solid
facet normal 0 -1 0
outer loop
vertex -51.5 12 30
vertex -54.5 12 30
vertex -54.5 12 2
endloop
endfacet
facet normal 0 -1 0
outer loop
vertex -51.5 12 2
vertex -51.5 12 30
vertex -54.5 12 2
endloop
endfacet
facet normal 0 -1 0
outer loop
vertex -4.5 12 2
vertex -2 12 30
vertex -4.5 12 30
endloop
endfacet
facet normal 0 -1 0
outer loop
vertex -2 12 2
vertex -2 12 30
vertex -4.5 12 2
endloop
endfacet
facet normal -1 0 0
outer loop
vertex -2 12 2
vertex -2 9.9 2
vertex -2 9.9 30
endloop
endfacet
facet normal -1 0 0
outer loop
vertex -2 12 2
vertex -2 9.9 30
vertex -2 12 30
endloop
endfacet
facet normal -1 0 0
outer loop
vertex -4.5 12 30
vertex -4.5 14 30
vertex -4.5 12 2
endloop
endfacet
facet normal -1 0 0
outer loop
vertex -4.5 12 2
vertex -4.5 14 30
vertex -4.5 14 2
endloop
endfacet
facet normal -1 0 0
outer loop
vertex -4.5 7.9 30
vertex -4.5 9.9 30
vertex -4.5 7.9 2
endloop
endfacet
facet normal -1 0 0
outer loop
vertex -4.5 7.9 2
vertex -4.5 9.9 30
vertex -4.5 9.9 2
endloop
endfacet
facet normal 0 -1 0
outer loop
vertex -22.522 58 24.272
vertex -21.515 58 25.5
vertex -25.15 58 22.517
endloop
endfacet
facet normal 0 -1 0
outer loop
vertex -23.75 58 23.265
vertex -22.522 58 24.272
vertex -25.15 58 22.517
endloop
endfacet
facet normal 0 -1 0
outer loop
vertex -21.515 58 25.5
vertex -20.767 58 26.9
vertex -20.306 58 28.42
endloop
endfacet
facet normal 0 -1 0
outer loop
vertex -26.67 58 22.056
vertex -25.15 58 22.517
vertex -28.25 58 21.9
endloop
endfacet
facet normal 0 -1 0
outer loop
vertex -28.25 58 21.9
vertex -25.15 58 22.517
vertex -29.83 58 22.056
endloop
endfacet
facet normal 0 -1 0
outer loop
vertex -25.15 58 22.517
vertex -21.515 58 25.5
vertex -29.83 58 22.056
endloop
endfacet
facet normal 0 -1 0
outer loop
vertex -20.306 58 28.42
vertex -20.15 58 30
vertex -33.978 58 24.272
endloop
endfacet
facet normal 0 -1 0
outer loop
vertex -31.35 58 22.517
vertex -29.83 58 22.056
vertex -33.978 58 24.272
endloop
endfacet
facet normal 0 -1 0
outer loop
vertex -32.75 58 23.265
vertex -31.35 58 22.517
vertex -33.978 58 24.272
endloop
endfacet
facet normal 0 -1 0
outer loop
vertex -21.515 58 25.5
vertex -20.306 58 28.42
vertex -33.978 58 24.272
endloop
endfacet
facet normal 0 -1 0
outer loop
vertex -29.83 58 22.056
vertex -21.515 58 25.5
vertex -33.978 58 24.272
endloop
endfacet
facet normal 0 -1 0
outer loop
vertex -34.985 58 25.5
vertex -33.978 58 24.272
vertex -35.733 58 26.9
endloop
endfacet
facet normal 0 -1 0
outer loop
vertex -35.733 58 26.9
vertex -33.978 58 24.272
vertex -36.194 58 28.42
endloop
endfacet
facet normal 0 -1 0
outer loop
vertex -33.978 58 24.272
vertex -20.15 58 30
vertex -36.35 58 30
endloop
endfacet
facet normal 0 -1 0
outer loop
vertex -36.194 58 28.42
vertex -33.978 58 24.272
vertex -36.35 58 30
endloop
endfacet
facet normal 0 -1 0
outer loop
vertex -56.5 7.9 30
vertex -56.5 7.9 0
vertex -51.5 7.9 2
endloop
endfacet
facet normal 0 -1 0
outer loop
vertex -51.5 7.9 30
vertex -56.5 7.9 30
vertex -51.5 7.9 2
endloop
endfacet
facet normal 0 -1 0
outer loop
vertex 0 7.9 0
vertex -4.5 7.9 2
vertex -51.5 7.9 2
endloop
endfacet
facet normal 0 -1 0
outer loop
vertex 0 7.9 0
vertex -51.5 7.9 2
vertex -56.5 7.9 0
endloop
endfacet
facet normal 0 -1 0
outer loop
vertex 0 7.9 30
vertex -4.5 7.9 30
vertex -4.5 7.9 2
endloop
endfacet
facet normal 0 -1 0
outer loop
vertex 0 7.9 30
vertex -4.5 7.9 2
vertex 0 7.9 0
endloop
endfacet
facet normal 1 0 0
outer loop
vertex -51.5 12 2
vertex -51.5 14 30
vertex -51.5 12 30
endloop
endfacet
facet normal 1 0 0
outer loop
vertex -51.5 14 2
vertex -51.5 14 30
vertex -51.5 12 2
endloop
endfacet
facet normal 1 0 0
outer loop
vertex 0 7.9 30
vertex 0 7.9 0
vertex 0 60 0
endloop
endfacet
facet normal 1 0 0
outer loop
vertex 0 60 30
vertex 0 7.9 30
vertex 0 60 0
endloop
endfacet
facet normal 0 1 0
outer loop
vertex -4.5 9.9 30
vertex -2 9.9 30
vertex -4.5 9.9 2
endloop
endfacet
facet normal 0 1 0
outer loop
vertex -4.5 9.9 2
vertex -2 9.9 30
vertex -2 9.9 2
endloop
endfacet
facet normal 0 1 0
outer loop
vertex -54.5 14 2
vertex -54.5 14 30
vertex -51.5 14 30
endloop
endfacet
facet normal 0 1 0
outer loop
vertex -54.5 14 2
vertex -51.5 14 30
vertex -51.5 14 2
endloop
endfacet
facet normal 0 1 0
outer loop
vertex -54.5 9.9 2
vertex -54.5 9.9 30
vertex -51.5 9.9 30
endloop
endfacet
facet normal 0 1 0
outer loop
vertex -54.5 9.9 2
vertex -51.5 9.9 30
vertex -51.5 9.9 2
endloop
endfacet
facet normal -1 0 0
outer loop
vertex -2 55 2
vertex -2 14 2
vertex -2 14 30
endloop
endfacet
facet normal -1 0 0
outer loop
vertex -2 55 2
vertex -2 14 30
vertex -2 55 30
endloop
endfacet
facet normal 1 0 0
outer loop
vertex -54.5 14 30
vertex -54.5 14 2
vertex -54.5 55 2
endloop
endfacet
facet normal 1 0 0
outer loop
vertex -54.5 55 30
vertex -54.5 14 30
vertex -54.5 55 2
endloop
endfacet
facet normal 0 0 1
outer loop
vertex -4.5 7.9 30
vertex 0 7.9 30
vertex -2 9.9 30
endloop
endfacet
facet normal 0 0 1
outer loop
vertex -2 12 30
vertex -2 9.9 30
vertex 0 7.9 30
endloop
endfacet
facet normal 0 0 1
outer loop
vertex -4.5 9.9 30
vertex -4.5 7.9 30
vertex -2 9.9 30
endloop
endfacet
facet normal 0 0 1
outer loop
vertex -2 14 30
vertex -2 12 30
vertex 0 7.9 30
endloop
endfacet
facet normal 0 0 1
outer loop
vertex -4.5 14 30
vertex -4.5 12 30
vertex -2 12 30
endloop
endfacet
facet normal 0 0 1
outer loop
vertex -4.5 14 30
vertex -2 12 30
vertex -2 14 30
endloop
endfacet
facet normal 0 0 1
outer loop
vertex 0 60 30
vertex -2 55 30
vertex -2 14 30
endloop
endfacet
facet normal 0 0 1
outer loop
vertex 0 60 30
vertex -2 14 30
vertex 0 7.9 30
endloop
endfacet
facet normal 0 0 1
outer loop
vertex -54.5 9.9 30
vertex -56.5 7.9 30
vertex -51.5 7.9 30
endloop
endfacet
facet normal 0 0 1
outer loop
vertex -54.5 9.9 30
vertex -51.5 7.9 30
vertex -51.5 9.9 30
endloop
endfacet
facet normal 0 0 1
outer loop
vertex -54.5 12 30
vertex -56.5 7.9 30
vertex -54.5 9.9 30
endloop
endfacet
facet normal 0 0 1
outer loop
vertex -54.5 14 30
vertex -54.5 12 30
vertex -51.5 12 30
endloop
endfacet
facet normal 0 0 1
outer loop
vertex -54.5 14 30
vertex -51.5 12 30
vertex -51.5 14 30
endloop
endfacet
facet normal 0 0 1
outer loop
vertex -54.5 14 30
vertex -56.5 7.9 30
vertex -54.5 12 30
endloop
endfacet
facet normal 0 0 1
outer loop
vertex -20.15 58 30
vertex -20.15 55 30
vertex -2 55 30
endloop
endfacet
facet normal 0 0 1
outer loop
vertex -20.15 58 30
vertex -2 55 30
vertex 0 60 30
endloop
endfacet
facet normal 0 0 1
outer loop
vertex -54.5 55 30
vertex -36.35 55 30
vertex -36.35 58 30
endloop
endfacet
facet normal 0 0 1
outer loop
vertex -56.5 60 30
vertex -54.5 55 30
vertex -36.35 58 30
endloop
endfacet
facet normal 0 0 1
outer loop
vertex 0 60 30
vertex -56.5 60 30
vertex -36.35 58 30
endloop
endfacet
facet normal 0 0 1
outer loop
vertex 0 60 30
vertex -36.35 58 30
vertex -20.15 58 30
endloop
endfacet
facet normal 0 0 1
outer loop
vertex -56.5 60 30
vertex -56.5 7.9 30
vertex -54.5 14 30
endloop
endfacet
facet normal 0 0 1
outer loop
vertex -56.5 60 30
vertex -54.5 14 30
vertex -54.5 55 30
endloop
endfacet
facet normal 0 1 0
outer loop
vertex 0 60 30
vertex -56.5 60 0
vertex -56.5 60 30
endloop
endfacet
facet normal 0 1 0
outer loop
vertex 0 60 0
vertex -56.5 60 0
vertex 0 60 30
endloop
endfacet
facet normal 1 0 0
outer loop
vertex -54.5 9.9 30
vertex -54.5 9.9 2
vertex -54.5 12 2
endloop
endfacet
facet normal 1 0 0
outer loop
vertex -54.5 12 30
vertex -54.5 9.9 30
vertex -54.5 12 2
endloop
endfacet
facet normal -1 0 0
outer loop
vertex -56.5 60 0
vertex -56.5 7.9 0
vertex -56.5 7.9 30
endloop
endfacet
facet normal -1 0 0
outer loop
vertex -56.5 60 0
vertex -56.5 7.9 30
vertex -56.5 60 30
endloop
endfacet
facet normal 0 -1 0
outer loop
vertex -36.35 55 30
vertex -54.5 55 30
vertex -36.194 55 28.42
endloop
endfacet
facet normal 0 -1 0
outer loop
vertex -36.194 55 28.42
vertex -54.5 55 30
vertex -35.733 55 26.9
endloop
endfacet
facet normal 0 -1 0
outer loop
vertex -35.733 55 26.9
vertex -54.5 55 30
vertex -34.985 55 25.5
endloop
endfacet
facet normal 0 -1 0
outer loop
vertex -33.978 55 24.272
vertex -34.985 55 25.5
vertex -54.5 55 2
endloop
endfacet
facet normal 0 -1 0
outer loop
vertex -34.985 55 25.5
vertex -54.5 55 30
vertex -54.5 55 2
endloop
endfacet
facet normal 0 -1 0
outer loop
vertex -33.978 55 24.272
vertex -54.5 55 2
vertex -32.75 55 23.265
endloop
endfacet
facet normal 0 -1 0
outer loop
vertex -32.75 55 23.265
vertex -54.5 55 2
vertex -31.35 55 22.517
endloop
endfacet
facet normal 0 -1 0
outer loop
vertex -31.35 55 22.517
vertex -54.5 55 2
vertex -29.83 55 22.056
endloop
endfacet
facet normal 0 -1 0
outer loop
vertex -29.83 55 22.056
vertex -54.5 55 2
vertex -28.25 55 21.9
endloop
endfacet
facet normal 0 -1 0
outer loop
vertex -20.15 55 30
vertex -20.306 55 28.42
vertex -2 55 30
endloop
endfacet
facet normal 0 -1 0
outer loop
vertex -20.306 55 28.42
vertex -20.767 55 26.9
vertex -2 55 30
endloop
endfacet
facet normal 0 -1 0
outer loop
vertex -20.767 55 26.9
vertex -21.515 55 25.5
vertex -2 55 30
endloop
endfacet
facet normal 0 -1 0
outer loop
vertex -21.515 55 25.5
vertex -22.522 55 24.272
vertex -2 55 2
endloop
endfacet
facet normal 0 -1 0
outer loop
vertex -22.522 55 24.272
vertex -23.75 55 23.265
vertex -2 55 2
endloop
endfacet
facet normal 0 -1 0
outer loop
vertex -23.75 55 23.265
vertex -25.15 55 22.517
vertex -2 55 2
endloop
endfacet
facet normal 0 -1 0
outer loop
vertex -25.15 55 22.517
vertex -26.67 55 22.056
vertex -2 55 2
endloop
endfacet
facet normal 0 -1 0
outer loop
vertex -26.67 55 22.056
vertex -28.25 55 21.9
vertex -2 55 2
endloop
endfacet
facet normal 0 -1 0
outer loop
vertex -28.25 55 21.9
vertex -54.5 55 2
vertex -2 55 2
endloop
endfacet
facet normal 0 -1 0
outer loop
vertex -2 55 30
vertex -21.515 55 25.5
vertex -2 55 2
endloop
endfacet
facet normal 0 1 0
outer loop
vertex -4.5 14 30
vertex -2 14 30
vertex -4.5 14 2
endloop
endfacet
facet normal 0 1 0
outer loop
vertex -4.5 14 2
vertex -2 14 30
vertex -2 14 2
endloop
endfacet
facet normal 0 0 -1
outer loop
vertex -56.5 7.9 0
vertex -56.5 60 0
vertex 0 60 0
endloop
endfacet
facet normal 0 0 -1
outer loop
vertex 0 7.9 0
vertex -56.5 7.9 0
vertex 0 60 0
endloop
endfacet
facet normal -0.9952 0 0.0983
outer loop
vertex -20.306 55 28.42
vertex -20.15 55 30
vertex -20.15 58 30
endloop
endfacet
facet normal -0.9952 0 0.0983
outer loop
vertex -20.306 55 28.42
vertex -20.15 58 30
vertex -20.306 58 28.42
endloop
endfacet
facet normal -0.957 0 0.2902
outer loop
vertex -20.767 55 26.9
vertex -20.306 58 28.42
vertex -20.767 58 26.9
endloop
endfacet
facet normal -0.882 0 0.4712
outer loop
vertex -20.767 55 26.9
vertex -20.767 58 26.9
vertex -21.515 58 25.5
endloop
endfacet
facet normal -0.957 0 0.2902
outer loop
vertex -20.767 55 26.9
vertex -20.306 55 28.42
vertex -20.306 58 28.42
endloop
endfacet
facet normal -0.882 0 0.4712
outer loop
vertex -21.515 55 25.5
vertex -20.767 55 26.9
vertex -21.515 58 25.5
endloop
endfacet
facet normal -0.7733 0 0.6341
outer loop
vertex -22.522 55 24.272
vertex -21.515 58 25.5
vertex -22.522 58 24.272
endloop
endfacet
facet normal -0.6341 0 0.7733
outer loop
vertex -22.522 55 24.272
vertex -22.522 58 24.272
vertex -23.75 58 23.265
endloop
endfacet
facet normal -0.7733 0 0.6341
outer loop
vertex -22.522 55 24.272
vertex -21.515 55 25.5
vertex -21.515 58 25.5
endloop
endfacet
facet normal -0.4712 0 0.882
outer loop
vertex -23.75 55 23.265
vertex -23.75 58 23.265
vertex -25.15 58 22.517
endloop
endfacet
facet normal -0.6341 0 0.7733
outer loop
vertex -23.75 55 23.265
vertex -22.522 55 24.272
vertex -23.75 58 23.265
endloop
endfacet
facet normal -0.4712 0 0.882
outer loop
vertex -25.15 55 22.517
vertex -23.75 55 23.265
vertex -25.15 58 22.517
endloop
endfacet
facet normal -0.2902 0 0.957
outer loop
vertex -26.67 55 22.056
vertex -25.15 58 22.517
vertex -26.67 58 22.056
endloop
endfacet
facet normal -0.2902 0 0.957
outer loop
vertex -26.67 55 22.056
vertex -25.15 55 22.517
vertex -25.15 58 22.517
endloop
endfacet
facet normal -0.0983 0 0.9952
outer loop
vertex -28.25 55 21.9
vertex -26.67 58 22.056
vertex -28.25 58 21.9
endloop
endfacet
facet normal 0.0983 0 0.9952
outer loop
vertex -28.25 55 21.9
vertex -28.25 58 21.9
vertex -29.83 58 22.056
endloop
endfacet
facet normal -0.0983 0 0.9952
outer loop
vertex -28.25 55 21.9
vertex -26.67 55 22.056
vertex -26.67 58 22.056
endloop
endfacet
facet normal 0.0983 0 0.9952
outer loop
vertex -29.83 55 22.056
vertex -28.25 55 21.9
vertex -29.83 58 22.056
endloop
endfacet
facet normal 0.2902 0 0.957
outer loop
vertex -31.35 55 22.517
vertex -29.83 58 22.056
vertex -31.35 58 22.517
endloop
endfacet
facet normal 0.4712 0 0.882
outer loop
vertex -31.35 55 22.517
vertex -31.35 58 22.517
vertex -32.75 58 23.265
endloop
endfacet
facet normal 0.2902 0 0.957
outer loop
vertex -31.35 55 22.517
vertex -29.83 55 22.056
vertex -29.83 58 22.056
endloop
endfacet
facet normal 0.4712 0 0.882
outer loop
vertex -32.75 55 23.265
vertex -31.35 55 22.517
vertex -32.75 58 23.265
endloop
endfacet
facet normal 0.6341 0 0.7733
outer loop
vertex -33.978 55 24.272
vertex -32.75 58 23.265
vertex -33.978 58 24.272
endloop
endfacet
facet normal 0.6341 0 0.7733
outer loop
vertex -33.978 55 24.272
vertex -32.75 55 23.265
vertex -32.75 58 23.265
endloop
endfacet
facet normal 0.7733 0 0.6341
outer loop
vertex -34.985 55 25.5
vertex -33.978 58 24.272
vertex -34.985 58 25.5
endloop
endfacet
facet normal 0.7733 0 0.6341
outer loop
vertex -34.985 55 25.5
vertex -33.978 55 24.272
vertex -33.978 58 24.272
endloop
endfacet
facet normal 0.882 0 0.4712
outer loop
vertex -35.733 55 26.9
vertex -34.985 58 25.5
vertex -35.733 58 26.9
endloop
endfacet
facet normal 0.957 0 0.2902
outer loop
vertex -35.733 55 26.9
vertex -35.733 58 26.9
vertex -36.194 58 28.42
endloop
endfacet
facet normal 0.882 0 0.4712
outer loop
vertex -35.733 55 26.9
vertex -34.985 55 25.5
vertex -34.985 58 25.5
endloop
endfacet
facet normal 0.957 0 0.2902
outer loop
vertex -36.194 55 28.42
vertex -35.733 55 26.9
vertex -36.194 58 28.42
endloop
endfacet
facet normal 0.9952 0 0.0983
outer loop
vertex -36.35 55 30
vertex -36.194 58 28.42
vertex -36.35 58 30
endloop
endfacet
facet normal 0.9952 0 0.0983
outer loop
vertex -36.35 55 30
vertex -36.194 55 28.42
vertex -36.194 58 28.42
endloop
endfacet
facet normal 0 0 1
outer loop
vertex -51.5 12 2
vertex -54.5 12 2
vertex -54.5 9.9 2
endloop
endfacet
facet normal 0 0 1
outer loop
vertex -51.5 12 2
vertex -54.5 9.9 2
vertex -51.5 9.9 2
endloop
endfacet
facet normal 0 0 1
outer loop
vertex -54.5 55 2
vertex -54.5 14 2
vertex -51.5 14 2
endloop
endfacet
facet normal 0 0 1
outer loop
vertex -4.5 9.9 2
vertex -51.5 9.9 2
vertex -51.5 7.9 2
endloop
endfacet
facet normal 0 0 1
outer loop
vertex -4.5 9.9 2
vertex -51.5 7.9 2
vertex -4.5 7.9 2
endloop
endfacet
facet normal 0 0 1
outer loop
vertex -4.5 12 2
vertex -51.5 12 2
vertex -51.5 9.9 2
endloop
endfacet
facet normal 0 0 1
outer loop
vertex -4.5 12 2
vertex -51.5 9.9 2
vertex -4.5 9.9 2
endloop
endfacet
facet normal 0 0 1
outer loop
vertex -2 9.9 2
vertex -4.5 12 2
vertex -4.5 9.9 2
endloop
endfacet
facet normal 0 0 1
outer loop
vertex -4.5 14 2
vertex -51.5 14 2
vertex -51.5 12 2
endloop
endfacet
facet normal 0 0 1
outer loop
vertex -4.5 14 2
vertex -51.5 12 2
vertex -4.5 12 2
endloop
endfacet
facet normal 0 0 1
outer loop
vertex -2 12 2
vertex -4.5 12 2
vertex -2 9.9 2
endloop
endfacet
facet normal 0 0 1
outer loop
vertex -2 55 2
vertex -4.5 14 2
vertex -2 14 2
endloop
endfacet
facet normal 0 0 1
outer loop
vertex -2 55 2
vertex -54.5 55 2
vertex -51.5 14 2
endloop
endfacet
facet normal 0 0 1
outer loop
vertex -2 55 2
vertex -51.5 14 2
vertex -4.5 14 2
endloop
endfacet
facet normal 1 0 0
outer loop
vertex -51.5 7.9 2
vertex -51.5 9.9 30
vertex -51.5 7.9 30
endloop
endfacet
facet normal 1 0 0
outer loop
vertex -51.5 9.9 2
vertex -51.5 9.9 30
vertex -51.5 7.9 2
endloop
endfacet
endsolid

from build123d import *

# Parameters (mm, degrees)
SKETCH1_W           = 56.5
SKETCH1_H           = 60
BOSS_EXTRUDE1_DEPTH = 30
SHELL1_T            = -2
SKETCH2_W           = 52.5
SKETCH2_H           = 3
BOSS_EXTRUDE2_DEPTH = 28
CUT_EXTRUDE5_DEPTH  = 3
SKETCH6_W           = 30
SKETCH6_H           = 2
BOSS_EXTRUDE3_DEPTH = 3
SKETCH7_W           = 30
SKETCH7_H           = 2
BOSS_EXTRUDE4_DEPTH = 3
SKETCH8_W           = 56.5
SKETCH8_H           = 30
CUT_EXTRUDE6_DEPTH  = 7.9


with BuildPart() as part:
    # Sketch1 → Boss-Extrude1 (new body)
    with BuildSketch(Plane.XY):
        with Locations((-28.25, 30)):
            Rectangle(SKETCH1_W, SKETCH1_H)
    extrude(amount=BOSS_EXTRUDE1_DEPTH)

    # Shell1
    shell1_openings = [part.faces().sort_by_distance(p)[0] for p in [
        (-28.25, 30, 30),
    ]]
    offset(amount=SHELL1_T, openings=shell1_openings, kind=Kind.INTERSECTION)

    # Sketch2 → Boss-Extrude2 (add)
    with BuildSketch(Plane.XY.offset(2)):
        with Locations((-28.25, 56.5)):
            Rectangle(SKETCH2_W, SKETCH2_H)
    extrude(amount=BOSS_EXTRUDE2_DEPTH)

    # Sketch3 → Cut-Extrude5 (cut)
    with BuildSketch(Plane.XZ.offset(-55)):
        with BuildLine():
            Line((-36.35, 30), (-20.15, 30))
            ThreePointArc((-20.15, 30), (-28.25, 21.9), (-36.35, 30))
        make_face()
    extrude(amount=-CUT_EXTRUDE5_DEPTH, mode=Mode.SUBTRACT)

    # Sketch6 → Boss-Extrude3 (add)
    with BuildSketch(Plane(origin=(-54.5, 0, 0), x_dir=(0, 0, -1), z_dir=(1, 0, 0))):
        with Locations((-15, 13)):
            Rectangle(SKETCH6_W, SKETCH6_H)
    boss_extrude3 = extrude(amount=BOSS_EXTRUDE3_DEPTH)

    # Sketch7 → Boss-Extrude4 (add)
    with BuildSketch(Plane(origin=(-54.5, 0, 0), x_dir=(0, 0, -1), z_dir=(1, 0, 0))):
        with Locations((-15, 8.9)):
            Rectangle(SKETCH7_W, SKETCH7_H)
    boss_extrude4 = extrude(amount=BOSS_EXTRUDE4_DEPTH)

    # Mirror1: Boss-Extrude3, Boss-Extrude4 across plane
    add(boss_extrude3.mirror(Plane(origin=(-28, 0, 0), x_dir=(0, 0, 1), z_dir=(1, 0, 0))))
    add(boss_extrude4.mirror(Plane(origin=(-28, 0, 0), x_dir=(0, 0, 1), z_dir=(1, 0, 0))))

    # Sketch8 → Cut-Extrude6 (cut)
    with BuildSketch(Plane.XZ):
        with Locations((-28.25, 15)):
            Rectangle(SKETCH8_W, SKETCH8_H)
    extrude(amount=-CUT_EXTRUDE6_DEPTH, mode=Mode.SUBTRACT)


solid = part.part
